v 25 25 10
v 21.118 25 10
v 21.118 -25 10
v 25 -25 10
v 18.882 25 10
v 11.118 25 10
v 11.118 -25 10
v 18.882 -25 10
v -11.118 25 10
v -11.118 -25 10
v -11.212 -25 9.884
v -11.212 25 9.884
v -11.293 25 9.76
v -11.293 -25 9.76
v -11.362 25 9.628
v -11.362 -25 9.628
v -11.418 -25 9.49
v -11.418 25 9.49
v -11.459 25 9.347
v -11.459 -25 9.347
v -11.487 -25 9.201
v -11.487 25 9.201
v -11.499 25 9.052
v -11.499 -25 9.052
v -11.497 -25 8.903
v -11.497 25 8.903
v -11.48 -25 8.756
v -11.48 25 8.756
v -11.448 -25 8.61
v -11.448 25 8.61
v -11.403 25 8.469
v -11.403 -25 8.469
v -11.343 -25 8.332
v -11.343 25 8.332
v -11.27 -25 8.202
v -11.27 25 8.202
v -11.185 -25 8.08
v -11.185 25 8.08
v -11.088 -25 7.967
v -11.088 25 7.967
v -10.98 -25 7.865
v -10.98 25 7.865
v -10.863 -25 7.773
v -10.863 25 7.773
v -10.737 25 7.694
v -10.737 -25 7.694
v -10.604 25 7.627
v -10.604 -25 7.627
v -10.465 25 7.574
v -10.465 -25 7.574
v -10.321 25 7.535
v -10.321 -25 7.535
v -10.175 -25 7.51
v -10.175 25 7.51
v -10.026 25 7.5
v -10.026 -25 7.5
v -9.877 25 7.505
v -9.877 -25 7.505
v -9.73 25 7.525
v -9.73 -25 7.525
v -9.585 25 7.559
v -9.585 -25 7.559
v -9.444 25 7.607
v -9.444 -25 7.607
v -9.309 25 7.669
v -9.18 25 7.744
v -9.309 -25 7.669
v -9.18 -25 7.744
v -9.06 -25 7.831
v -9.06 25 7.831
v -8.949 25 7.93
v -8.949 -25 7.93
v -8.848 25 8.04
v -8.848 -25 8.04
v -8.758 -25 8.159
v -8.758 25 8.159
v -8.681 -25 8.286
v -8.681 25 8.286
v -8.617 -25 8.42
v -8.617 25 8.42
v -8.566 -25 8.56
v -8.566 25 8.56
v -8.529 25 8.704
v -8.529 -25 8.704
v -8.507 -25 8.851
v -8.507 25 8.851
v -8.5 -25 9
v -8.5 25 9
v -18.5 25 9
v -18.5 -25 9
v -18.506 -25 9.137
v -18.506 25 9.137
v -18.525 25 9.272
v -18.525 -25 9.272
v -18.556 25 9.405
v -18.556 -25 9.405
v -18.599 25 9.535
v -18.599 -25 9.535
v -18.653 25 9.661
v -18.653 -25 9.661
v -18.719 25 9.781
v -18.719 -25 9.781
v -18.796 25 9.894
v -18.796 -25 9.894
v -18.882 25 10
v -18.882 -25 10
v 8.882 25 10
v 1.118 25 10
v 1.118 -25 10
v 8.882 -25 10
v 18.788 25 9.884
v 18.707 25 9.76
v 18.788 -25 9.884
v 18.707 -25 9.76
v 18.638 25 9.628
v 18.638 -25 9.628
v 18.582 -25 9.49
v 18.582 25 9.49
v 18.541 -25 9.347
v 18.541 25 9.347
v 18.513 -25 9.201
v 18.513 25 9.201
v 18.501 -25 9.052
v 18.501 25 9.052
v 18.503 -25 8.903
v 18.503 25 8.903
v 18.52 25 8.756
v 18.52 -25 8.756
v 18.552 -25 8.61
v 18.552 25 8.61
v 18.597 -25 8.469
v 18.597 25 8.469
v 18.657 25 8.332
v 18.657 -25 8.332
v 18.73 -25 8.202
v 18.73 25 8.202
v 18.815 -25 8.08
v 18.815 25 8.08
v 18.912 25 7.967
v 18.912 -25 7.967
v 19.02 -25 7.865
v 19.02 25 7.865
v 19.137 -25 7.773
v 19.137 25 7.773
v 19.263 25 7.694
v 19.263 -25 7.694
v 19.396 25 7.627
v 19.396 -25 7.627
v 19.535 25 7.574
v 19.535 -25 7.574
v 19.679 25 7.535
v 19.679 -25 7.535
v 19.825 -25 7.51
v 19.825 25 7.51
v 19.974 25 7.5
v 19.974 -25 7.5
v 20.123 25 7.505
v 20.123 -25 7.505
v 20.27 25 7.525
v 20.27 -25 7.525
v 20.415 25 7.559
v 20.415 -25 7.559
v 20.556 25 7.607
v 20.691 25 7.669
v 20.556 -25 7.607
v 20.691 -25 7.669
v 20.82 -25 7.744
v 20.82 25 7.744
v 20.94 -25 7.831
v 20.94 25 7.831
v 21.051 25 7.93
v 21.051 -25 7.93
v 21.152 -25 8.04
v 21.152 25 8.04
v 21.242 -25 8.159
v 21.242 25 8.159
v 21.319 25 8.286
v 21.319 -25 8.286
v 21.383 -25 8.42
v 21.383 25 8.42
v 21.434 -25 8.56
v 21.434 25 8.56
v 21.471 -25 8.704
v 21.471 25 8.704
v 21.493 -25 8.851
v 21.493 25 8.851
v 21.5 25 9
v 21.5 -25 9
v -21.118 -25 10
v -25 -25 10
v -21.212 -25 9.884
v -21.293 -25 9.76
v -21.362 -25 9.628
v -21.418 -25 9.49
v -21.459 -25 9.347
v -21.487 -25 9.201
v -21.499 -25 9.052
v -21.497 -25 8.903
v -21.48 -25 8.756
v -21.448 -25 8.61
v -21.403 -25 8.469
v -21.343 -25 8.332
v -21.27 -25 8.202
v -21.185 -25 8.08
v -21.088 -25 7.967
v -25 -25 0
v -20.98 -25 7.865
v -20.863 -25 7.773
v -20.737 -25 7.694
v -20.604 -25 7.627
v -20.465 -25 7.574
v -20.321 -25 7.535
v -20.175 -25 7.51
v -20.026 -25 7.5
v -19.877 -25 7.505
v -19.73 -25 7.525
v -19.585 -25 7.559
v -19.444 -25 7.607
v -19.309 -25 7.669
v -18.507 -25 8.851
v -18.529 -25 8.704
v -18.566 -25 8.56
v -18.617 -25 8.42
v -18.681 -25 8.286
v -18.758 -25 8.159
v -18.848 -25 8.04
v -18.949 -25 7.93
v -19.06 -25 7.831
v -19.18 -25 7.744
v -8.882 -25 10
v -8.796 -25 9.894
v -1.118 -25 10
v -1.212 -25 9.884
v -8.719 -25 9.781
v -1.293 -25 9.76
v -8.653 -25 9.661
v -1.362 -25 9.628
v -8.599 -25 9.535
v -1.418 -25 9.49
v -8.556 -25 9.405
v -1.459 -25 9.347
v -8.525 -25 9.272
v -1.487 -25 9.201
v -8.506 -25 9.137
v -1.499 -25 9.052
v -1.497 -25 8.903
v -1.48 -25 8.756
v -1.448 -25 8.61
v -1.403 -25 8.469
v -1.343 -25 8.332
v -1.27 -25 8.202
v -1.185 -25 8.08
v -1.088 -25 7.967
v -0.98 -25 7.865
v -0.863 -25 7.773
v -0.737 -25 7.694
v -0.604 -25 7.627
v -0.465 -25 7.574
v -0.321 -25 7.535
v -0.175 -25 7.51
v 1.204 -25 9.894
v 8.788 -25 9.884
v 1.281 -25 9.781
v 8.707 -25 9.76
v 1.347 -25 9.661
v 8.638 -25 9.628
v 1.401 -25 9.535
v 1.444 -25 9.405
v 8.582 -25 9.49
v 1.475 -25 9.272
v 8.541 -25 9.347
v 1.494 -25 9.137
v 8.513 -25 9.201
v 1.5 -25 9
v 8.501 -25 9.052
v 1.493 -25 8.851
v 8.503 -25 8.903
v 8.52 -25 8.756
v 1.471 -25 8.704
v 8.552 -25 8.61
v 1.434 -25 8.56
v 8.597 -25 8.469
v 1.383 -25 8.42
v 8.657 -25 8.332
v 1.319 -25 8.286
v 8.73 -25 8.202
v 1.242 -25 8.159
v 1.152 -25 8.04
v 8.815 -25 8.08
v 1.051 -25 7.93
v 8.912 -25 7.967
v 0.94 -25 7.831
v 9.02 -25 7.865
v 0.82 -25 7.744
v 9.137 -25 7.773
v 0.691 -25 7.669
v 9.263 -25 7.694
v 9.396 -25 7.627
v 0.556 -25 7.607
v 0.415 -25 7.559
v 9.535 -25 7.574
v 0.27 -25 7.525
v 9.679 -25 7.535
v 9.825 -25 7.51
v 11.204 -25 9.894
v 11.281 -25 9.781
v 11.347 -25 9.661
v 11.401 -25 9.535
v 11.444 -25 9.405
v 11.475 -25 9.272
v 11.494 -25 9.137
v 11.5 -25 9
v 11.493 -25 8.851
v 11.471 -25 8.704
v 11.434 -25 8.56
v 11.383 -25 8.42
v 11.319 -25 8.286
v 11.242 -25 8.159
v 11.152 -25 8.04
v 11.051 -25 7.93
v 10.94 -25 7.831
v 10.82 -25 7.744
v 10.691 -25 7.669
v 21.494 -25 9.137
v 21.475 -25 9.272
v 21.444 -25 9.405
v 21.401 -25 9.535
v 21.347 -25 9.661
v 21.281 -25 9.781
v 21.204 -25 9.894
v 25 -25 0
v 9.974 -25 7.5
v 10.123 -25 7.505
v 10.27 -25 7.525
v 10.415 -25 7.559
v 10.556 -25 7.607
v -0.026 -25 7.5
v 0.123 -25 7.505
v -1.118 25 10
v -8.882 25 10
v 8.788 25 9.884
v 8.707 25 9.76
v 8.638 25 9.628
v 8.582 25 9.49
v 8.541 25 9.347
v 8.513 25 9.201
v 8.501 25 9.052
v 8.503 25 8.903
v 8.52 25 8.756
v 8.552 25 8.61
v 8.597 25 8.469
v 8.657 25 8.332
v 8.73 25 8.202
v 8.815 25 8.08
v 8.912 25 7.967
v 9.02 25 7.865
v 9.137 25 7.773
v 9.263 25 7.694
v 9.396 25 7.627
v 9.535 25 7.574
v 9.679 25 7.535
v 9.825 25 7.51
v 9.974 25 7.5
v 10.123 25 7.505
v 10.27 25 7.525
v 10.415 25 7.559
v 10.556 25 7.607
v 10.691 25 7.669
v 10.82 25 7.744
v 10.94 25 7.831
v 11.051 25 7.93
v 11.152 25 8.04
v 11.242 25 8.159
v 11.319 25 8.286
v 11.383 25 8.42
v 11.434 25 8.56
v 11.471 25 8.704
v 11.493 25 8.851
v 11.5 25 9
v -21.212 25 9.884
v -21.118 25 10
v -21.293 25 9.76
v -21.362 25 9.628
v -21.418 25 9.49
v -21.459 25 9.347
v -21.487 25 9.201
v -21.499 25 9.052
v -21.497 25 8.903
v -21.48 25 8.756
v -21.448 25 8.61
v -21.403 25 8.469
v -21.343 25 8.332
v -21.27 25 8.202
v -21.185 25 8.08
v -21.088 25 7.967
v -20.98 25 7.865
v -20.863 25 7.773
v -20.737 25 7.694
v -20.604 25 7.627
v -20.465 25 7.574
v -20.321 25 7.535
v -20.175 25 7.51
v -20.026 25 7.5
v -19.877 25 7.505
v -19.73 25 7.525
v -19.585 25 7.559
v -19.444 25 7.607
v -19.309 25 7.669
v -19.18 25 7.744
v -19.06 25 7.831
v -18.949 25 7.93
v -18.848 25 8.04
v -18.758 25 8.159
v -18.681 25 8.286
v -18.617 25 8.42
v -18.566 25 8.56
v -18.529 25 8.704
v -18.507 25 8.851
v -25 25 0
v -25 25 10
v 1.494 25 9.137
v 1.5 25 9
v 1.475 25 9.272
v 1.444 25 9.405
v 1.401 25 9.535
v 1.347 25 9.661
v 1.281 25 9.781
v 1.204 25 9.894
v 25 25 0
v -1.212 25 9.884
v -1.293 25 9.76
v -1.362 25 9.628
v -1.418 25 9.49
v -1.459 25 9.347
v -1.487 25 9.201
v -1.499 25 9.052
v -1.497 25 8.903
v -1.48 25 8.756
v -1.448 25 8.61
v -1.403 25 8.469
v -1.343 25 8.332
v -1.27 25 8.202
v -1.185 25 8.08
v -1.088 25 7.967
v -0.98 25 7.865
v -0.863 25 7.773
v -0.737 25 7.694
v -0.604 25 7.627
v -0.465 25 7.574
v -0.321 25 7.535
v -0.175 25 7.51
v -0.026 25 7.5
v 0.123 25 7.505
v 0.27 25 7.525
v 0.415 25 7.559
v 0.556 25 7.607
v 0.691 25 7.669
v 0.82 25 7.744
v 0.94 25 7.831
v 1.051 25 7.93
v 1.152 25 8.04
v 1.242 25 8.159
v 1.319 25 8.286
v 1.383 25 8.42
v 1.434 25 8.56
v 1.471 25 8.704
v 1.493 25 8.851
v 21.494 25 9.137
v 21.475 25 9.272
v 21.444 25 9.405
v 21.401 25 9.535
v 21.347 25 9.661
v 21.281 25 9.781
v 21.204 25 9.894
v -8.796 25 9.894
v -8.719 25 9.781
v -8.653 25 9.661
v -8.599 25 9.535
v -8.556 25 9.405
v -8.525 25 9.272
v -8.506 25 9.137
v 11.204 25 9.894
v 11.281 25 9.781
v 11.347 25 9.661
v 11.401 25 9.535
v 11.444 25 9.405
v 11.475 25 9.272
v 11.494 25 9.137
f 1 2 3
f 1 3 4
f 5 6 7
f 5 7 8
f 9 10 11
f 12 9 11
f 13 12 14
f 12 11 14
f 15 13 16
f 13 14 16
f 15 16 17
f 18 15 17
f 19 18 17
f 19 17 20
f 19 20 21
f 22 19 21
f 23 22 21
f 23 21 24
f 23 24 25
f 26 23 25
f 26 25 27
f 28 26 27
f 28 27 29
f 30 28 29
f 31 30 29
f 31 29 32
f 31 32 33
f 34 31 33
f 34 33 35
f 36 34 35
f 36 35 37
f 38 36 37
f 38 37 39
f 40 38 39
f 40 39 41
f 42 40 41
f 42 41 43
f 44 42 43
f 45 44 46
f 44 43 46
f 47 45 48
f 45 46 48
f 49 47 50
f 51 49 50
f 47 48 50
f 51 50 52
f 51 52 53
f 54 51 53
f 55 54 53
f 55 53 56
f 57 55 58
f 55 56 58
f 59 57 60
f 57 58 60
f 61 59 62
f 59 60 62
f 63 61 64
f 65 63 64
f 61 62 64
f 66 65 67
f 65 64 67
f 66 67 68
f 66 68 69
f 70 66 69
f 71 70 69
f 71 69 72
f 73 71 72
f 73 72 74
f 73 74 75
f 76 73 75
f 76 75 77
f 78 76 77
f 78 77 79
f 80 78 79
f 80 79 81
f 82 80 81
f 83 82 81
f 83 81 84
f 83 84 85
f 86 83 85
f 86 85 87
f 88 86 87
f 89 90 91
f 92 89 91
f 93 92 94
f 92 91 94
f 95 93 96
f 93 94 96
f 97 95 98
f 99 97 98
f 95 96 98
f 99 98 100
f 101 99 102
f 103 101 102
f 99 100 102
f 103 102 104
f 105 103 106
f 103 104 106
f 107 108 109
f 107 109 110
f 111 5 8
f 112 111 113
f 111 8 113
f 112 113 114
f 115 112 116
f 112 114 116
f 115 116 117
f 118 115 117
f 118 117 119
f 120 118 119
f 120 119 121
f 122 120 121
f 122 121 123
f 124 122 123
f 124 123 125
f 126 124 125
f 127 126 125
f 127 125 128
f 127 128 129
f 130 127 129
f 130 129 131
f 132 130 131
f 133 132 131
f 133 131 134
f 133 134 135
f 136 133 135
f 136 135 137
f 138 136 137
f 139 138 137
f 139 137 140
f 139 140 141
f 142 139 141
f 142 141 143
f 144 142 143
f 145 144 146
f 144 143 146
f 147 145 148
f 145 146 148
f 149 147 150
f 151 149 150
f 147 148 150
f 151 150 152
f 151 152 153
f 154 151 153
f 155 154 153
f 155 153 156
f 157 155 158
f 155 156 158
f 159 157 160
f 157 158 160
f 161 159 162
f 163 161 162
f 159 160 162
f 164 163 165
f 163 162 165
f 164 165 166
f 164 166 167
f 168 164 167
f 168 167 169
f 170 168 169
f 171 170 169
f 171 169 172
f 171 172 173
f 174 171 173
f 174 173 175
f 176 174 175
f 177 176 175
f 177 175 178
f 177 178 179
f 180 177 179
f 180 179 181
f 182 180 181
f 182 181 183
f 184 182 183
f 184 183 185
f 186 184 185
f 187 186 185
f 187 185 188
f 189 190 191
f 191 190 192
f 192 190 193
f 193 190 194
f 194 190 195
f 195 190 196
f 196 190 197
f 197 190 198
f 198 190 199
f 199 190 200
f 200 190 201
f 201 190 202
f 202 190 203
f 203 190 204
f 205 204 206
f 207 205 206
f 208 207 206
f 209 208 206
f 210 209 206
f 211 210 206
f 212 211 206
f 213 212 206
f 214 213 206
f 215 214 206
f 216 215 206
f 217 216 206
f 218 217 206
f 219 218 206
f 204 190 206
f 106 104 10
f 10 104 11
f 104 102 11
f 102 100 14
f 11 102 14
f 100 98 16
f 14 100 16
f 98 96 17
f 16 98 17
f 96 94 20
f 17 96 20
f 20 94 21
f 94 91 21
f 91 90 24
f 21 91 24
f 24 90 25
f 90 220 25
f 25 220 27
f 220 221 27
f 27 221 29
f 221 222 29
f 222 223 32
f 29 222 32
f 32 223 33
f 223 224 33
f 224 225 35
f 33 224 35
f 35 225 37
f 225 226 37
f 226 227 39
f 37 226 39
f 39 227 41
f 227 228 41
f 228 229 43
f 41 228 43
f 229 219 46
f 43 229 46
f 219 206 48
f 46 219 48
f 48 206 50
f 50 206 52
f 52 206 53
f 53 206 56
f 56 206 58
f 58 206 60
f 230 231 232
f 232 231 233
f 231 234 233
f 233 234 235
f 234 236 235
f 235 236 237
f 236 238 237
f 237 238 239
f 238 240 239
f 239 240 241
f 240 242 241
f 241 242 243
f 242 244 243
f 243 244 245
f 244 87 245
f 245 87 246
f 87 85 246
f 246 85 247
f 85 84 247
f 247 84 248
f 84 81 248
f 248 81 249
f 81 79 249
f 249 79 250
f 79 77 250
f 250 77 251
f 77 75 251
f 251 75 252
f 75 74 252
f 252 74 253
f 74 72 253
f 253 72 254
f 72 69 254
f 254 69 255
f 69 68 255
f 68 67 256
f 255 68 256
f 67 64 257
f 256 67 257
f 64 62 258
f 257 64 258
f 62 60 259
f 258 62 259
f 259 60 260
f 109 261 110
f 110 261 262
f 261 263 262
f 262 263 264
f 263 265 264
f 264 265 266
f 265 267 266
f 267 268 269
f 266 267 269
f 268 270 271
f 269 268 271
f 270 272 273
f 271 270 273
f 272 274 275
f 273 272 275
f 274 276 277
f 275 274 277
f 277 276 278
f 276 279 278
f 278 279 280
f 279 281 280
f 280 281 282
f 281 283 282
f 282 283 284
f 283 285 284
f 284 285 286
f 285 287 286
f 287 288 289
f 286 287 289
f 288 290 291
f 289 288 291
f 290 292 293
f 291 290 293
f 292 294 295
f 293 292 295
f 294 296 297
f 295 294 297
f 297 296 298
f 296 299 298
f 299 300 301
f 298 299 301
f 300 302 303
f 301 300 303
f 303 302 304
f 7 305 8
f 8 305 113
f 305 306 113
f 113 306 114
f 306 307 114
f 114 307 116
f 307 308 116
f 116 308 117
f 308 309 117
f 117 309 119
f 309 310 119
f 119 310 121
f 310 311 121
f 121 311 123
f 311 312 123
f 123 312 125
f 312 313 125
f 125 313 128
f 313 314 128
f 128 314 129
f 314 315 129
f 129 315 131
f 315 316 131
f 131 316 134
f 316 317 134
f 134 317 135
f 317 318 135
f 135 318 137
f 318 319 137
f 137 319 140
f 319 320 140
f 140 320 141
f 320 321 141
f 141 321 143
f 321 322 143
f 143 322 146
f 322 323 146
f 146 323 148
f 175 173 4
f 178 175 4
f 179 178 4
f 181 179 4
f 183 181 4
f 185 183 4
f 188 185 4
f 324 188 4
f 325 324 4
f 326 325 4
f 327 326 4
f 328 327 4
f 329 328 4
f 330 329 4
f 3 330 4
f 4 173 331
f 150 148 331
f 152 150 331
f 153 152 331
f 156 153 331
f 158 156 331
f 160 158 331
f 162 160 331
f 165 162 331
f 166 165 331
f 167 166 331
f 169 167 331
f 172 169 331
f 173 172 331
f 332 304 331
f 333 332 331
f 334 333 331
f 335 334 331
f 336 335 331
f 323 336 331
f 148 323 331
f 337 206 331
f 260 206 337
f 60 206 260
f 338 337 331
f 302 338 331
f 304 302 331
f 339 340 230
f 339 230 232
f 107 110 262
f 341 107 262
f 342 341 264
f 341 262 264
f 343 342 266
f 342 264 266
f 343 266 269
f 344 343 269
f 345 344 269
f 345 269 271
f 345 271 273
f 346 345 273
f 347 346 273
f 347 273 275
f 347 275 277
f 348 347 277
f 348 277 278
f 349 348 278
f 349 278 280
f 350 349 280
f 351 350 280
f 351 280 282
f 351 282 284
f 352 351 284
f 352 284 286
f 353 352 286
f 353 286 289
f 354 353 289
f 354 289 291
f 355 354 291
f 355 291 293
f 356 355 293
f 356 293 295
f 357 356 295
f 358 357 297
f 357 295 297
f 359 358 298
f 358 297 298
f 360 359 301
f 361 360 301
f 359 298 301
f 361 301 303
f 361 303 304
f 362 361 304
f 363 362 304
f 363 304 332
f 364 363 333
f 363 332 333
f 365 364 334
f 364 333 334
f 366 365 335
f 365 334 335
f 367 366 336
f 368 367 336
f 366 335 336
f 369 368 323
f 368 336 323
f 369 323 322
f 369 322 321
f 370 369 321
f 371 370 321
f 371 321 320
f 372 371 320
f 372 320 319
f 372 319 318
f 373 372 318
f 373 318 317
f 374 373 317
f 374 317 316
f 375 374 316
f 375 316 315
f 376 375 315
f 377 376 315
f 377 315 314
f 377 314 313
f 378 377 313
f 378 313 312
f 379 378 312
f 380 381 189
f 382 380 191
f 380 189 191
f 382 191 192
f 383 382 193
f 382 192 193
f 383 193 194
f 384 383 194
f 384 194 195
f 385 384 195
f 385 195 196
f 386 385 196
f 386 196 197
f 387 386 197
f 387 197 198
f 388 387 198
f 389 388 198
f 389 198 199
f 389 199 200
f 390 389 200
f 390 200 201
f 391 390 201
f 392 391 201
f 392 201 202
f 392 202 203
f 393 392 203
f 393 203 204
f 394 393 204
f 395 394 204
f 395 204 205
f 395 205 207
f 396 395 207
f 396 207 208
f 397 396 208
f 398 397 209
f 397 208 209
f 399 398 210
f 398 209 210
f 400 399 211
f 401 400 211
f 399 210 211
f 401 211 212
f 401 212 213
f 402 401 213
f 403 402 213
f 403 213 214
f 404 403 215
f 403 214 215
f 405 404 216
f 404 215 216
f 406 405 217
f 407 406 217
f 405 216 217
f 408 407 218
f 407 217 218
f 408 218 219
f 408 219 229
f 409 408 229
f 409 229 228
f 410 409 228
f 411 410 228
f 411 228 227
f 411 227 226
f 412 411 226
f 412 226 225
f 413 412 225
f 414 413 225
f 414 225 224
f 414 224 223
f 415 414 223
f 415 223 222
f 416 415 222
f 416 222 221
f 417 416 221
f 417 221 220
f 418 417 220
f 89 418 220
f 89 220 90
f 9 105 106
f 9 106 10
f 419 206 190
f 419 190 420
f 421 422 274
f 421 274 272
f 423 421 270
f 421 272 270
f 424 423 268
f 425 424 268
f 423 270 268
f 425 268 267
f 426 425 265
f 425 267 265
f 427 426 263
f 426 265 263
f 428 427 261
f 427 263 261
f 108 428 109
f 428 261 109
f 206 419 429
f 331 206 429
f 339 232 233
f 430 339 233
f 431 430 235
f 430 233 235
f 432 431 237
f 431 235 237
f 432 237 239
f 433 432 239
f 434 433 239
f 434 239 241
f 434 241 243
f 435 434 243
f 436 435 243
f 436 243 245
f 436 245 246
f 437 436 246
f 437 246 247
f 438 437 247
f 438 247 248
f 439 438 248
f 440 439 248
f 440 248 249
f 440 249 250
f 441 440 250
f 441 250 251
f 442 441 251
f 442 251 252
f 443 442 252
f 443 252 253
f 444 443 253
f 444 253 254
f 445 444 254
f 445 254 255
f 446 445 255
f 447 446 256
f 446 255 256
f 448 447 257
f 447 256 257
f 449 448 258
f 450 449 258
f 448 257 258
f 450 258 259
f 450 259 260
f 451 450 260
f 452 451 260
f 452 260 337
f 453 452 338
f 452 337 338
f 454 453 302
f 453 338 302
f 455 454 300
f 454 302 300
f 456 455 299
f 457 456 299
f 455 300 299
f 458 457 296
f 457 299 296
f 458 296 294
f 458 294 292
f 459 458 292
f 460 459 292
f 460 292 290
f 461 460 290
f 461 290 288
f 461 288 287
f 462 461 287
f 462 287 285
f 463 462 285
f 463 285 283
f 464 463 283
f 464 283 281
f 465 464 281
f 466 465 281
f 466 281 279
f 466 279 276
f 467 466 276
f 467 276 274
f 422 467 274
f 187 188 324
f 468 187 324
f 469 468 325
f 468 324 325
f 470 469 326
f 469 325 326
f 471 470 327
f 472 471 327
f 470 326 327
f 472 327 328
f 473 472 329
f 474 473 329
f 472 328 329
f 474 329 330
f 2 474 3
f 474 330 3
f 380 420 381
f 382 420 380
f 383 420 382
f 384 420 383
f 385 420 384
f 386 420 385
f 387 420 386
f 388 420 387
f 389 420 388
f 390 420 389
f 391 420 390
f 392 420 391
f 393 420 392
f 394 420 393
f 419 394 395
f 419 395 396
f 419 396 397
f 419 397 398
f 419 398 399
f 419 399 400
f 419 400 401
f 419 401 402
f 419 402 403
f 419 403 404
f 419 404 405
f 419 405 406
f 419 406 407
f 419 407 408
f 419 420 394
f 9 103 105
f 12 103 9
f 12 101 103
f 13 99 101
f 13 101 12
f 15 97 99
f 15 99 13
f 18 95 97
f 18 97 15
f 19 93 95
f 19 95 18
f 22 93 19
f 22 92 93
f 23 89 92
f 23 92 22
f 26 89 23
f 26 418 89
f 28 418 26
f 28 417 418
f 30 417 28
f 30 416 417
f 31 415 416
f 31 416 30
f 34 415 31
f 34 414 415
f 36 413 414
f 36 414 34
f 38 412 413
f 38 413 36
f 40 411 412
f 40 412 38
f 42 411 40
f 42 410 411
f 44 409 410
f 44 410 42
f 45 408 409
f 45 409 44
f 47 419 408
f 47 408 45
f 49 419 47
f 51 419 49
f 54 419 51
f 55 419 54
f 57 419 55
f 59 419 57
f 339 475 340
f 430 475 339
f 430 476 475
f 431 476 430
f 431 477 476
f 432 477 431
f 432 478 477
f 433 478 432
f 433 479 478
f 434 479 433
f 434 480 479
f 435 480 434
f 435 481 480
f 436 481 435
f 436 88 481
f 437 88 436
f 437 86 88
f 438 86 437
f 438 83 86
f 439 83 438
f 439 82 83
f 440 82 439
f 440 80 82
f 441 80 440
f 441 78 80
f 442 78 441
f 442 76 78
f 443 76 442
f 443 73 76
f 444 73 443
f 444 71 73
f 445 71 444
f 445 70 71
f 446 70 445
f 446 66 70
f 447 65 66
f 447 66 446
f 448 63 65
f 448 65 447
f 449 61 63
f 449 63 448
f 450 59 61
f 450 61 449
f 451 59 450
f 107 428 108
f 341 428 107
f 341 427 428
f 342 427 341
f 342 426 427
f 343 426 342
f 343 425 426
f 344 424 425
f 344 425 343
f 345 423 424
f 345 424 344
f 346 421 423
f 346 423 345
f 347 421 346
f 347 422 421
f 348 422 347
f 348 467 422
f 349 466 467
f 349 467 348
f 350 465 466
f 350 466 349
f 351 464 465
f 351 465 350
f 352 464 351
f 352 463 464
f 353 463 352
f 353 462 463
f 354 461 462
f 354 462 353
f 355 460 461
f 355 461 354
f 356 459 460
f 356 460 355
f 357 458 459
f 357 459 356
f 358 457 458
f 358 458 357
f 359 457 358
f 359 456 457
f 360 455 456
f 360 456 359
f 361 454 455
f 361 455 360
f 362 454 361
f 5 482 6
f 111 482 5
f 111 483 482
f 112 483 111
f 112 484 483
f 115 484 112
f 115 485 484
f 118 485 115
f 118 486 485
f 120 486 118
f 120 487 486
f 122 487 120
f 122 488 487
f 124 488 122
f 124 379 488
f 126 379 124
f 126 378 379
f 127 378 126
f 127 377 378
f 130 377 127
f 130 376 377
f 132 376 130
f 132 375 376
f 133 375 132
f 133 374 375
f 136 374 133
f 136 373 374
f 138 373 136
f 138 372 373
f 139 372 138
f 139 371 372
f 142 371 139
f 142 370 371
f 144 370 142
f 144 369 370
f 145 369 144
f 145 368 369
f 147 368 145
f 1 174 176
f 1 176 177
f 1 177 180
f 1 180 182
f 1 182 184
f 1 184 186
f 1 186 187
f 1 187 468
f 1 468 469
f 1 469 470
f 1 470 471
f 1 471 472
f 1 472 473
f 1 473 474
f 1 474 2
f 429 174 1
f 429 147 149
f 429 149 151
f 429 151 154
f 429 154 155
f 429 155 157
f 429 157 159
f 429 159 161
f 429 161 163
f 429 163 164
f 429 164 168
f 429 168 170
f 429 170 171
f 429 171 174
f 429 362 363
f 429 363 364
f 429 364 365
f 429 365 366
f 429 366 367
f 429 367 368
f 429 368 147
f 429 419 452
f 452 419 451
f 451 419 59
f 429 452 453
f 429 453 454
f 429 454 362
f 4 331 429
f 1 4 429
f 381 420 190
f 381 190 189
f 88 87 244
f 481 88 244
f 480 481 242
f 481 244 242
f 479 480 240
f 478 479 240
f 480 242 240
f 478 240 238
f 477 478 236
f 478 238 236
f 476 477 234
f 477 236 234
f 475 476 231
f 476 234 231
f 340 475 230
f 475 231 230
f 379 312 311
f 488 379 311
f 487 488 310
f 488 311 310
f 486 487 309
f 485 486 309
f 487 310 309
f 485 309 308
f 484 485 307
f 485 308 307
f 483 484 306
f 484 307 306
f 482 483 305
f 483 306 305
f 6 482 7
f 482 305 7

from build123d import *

# Parameters (mm, degrees)
F0_W     = 50
F0_H     = 50
F1_DEPTH = 10
F3_DEPTH = 50.001


# Not quite as in the source:
# - a feature names something its author has since deleted; it is built from what else it names


with BuildPart() as f1:
    # F0 (on Top) → F1 (new body)
    with BuildSketch(Plane.XY):
        Rectangle(F0_W, F0_H)
    extrude(amount=F1_DEPTH)

    # F2 (on face) → F3 (cut, through all)
    with BuildSketch(Plane.XZ.offset(25)):
        with BuildLine():
            Line((8.8819660113, 10), (11.1180339887, 10))
            ThreePointArc((11.1180339887, 10), (10, 10.5), (8.8819660113, 10))
        make_face()
        with BuildLine():
            ThreePointArc((1.1180339887, 10), (0, 10.5), (-1.1180339887, 10))
            Line((-1.1180339887, 10), (1.1180339887, 10))
        make_face()
        with BuildLine():
            ThreePointArc((-8.8819660113, 10), (-10, 10.5), (-11.1180339887, 10))
            Line((-11.1180339887, 10), (-8.8819660113, 10))
        make_face()
        with BuildLine():
            ThreePointArc((-18.8819660113, 10), (-20, 10.5), (-21.1180339887, 10))
            Line((-21.1180339887, 10), (-18.8819660113, 10))
        make_face()
        with BuildLine():
            ThreePointArc((11.5, 9), (11.4012585384, 9.5352331347), (11.1180339887, 10))
            Line((11.1180339887, 10), (8.8819660113, 10))
            ThreePointArc((8.8819660113, 10), (9.4647668653, 7.5987414616), (11.5, 9))
        make_face()
        with BuildLine():
            Line((1.1180339887, 10), (-1.1180339887, 10))
            ThreePointArc((-1.1180339887, 10), (-0.5352331347, 7.5987414616), (1.5, 9))
            ThreePointArc((1.5, 9), (1.4012585384, 9.5352331347), (1.1180339887, 10))
        make_face()
        with BuildLine():
            Line((-8.8819660113, 10), (-11.1180339887, 10))
            ThreePointArc((-11.1180339887, 10), (-10.5352331347, 7.5987414616), (-8.5, 9))
            ThreePointArc((-8.5, 9), (-8.5987414616, 9.5352331347), (-8.8819660113, 10))
        make_face()
        with BuildLine():
            Line((-18.8819660113, 10), (-21.1180339887, 10))
            ThreePointArc((-21.1180339887, 10), (-20.5352331347, 7.5987414616), (-18.5, 9))
            ThreePointArc((-18.5, 9), (-18.5987414616, 9.5352331347), (-18.8819660113, 10))
        make_face()
        with BuildLine():
            ThreePointArc((21.5, 9), (21.4012585384, 9.5352331347), (21.1180339887, 10))
            Line((21.1180339887, 10), (18.8819660113, 10))
            ThreePointArc((18.8819660113, 10), (19.4647668653, 7.5987414616), (21.5, 9))
        make_face()
    extrude(amount=-F3_DEPTH, mode=Mode.SUBTRACT)


solid = f1.part
